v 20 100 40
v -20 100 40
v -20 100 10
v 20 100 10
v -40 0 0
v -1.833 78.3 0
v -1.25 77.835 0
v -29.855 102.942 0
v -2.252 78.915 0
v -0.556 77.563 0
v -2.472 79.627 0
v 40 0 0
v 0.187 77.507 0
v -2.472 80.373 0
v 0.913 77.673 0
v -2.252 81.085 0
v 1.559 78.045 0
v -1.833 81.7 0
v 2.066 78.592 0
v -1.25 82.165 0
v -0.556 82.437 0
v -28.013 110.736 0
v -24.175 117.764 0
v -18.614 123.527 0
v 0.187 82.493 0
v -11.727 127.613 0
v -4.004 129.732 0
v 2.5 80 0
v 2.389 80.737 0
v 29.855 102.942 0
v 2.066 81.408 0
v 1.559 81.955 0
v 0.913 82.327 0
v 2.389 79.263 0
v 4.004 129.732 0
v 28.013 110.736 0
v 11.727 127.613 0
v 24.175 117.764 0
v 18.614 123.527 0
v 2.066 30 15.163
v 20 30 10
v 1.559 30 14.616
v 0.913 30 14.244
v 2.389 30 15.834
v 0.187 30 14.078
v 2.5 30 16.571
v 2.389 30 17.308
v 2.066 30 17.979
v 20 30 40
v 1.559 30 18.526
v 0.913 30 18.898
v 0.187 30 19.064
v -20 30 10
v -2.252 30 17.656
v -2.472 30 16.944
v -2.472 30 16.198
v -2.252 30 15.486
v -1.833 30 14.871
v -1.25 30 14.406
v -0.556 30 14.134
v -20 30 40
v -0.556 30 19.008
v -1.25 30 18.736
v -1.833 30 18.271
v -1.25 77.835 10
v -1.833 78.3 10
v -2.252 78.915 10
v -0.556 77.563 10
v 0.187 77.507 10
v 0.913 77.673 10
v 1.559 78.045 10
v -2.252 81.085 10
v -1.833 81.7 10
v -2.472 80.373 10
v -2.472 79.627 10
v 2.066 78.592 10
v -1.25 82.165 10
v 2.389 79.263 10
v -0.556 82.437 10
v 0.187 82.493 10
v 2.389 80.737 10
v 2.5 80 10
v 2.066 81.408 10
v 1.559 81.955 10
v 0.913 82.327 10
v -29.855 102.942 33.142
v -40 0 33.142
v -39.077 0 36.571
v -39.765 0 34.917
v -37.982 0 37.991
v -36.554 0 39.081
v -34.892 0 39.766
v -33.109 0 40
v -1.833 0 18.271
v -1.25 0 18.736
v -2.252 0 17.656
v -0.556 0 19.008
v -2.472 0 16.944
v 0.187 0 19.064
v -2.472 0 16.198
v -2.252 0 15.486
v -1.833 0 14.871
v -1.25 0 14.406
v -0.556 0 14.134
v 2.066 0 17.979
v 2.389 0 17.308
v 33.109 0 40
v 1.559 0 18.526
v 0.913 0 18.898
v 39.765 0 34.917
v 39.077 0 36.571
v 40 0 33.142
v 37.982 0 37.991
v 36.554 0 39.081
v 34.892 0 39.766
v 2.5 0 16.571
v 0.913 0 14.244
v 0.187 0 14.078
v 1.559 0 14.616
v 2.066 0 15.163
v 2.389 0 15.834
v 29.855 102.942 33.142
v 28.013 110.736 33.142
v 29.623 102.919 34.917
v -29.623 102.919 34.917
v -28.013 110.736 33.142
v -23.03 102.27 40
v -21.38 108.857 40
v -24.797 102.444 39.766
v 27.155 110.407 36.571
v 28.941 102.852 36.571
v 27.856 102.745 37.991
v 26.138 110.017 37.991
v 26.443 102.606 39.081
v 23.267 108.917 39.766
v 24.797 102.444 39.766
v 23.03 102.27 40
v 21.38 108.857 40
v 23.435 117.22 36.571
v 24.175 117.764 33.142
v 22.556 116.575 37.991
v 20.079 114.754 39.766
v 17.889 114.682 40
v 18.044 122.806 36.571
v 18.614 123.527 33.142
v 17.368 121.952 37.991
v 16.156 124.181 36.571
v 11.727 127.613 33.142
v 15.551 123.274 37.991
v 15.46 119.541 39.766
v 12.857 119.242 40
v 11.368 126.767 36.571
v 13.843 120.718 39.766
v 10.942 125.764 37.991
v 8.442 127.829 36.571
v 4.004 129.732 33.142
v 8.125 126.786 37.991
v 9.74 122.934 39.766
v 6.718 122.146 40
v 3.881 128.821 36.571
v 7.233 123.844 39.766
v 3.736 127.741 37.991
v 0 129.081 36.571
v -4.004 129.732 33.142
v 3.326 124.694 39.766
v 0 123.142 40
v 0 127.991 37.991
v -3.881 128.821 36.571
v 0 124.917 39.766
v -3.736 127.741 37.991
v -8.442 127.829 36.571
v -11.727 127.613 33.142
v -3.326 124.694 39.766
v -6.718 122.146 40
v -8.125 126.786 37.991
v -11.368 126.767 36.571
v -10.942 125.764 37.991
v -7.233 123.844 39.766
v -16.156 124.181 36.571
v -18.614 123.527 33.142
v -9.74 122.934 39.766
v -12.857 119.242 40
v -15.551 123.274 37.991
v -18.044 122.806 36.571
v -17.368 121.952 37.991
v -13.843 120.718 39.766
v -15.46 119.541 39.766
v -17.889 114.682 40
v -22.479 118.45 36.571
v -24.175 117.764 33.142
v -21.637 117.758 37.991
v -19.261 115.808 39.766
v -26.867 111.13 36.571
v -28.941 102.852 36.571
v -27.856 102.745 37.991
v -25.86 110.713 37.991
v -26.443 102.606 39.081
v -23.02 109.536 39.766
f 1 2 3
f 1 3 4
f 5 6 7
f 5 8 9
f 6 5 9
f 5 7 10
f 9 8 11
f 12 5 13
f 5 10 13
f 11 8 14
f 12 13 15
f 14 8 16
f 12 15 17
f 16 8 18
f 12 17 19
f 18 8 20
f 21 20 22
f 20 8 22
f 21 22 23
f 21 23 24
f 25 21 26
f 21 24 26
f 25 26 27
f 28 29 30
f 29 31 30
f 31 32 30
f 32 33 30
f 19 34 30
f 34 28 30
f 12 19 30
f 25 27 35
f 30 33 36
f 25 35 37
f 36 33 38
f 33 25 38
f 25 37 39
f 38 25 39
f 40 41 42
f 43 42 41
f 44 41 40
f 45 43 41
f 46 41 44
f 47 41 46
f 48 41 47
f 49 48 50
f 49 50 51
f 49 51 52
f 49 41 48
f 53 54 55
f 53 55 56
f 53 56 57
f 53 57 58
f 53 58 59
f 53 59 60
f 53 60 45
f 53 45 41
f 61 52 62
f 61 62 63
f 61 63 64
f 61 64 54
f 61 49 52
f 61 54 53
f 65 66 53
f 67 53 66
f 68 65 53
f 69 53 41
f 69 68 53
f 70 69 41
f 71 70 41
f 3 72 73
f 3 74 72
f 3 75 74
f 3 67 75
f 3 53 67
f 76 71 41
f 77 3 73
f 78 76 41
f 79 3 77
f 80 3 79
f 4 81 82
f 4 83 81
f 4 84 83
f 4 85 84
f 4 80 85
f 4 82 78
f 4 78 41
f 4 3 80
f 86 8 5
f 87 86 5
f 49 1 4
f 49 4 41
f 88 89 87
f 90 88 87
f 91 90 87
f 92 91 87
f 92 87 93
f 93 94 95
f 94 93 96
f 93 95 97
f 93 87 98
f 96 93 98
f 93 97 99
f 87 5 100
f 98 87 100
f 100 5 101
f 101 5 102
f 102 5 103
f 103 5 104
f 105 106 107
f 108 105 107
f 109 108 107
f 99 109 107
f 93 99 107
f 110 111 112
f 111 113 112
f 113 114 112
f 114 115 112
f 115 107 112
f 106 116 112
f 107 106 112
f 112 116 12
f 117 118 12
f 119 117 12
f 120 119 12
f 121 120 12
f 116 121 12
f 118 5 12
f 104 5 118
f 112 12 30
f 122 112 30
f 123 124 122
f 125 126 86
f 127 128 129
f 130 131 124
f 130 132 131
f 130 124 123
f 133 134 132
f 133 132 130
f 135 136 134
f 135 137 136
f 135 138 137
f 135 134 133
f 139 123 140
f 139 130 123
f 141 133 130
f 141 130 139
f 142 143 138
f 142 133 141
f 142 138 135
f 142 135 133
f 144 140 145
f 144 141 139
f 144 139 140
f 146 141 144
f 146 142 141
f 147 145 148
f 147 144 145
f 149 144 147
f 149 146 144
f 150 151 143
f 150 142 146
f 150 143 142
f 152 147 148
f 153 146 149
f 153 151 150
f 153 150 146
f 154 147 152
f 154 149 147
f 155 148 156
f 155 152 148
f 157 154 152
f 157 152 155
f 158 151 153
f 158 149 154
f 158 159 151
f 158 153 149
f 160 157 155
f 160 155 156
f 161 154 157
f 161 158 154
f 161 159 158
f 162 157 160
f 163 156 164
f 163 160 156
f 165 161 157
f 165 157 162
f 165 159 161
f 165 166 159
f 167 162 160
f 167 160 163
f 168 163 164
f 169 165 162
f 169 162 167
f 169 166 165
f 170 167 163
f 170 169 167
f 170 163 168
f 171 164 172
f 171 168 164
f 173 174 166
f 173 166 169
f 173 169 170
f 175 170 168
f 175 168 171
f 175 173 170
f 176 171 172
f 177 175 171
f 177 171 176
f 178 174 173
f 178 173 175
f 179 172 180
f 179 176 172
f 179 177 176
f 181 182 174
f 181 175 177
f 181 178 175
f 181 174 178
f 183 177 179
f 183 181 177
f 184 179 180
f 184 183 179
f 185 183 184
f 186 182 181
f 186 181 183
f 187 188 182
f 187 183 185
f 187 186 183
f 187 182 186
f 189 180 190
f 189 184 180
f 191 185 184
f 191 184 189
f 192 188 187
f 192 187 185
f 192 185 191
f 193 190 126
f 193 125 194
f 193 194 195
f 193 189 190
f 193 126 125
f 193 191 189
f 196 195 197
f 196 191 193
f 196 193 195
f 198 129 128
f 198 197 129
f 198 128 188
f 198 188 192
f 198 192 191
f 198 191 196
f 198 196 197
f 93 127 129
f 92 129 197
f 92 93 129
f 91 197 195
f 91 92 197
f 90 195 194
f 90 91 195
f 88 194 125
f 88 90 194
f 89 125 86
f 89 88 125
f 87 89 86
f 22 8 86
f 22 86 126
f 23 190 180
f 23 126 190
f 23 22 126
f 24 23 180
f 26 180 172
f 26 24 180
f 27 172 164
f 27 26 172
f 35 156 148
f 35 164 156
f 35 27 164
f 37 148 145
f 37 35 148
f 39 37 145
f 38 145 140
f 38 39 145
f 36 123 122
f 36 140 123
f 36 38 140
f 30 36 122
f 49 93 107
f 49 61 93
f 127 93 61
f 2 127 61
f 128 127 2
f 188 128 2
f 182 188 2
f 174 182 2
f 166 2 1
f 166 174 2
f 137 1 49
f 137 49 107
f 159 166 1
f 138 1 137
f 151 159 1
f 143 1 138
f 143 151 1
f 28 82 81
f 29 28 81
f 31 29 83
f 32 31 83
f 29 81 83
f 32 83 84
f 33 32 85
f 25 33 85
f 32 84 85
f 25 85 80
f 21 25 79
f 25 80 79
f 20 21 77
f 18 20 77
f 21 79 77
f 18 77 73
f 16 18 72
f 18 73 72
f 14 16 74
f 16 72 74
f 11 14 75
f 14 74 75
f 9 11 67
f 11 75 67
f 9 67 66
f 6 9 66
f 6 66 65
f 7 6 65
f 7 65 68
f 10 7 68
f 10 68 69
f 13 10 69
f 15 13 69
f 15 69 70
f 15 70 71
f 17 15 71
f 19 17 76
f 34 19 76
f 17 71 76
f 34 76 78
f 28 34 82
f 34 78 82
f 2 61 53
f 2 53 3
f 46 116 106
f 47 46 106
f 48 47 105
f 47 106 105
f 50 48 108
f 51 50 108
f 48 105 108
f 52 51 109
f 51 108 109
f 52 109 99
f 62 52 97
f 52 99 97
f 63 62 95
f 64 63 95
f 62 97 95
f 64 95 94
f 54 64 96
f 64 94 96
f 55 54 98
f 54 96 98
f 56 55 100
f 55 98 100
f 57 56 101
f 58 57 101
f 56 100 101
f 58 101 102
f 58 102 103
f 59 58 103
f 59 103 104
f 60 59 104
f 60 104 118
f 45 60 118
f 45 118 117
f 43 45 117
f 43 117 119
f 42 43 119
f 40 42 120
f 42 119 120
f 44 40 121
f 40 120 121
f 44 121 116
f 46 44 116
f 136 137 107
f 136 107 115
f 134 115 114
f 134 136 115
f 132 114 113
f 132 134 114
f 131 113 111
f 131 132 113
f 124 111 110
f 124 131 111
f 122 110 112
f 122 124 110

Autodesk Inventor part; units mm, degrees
ref_plane "YZ Plane" through (0, 0, 0) normal (1, 0, 0) x (0, 1, 0)
ref_plane "XZ Plane" through (0, 0, 0) normal (0, 1, 0) x (-1, 0, 0)
ref_plane "XY Plane" through (0, 0, 0) normal (0, 0, 1) x (1, 0, 0)
sketch "Sketch1" plane through (0, 0, 0) normal (0, 0, 1) x (1, 0, 0)
  arc A0 (29.8554, 102.9422) -> (-29.8554, 102.9422) centre (0, 100) ccw
  line L0 (-29.8554, 102.9422) -> (-40, 0)
  line L1 (-40, 0) -> (40, 0)
  line L2 (40, 0) -> (29.8554, 102.9422)
  point P0 (0, 0)
  point P1 (0, 0)
  dimension "d0" = 80
  dimension "d1" = 60
  dimension "d2" = 100
extrude "Extrusion1" add sketch "Sketch1" along normal blind 40
sketch "Sketch2" plane through (0, 0, 40) normal (0, 0, 1) x (1, 0, 0)
  line L0 (-20, 100) -> (20, 100)
  line L1 (20, 100) -> (20, 30)
  line L2 (20, 30) -> (-20, 30)
  line L3 (-20, 30) -> (-20, 100)
  line L4 (-40, 0) -> (40, 0) projected
  arc A0 (29.8554, 102.9422) -> (-29.8554, 102.9422) centre (0, 100) ccw projected
  point P0 (0, 0)
  point P1 (0, 100)
  point P2 (0, 0)
  point P3 (0, 130)
  dimension "d5" = 70
  dimension "d6" = 40
  dimension "d7" = 30
extrude "Extrusion2" cut sketch "Sketch2" against normal blind 30
fillet "Fillet1" radius 6.858 3 edges at (0, 130, 40) (-34.9277, 51.4711, 40) (34.9277, 51.4711, 40)
sketch "Sketch3" plane through (-40, 0, 0) normal (0, -1, 0) x (1, 0, 0)
  line L0 (0, 0) -> (80, 0) projected
  line L1 (80, 0) -> (80, 33.142) projected
  line L2 (6.8912, 40) -> (73.1088, 40) projected
  circle A0 centre (40, 16.571) radius 2.5
  point P0 (40, 0)
  point P1 (40, 40)
  point P2 (80, 16.571)
  dimension "d11" = 5
extrude "Extrusion3" cut sketch "Sketch3" against normal blind 30
sketch "Sketch4" plane through (0, 0, 10) normal (0, 0, 1) x (1, 0, 0)
  circle A0 centre (0, 80) radius 2.5
  line L0 (20, 30) -> (-20, 30) projected
  line L1 (20, 100) -> (20, 30) projected
  line L2 (-20, 100) -> (20, 100) projected
  line L3 (-20, 30) -> (-20, 100) projected
  point P0 (0, 0)
  dimension "d14" = 20
  dimension "d15" = 5
  dimension "d16" = 20
extrude "Extrusion4" cut sketch "Sketch4" against normal blind 30 contours A0
properties part number "Robot_arm_3"
